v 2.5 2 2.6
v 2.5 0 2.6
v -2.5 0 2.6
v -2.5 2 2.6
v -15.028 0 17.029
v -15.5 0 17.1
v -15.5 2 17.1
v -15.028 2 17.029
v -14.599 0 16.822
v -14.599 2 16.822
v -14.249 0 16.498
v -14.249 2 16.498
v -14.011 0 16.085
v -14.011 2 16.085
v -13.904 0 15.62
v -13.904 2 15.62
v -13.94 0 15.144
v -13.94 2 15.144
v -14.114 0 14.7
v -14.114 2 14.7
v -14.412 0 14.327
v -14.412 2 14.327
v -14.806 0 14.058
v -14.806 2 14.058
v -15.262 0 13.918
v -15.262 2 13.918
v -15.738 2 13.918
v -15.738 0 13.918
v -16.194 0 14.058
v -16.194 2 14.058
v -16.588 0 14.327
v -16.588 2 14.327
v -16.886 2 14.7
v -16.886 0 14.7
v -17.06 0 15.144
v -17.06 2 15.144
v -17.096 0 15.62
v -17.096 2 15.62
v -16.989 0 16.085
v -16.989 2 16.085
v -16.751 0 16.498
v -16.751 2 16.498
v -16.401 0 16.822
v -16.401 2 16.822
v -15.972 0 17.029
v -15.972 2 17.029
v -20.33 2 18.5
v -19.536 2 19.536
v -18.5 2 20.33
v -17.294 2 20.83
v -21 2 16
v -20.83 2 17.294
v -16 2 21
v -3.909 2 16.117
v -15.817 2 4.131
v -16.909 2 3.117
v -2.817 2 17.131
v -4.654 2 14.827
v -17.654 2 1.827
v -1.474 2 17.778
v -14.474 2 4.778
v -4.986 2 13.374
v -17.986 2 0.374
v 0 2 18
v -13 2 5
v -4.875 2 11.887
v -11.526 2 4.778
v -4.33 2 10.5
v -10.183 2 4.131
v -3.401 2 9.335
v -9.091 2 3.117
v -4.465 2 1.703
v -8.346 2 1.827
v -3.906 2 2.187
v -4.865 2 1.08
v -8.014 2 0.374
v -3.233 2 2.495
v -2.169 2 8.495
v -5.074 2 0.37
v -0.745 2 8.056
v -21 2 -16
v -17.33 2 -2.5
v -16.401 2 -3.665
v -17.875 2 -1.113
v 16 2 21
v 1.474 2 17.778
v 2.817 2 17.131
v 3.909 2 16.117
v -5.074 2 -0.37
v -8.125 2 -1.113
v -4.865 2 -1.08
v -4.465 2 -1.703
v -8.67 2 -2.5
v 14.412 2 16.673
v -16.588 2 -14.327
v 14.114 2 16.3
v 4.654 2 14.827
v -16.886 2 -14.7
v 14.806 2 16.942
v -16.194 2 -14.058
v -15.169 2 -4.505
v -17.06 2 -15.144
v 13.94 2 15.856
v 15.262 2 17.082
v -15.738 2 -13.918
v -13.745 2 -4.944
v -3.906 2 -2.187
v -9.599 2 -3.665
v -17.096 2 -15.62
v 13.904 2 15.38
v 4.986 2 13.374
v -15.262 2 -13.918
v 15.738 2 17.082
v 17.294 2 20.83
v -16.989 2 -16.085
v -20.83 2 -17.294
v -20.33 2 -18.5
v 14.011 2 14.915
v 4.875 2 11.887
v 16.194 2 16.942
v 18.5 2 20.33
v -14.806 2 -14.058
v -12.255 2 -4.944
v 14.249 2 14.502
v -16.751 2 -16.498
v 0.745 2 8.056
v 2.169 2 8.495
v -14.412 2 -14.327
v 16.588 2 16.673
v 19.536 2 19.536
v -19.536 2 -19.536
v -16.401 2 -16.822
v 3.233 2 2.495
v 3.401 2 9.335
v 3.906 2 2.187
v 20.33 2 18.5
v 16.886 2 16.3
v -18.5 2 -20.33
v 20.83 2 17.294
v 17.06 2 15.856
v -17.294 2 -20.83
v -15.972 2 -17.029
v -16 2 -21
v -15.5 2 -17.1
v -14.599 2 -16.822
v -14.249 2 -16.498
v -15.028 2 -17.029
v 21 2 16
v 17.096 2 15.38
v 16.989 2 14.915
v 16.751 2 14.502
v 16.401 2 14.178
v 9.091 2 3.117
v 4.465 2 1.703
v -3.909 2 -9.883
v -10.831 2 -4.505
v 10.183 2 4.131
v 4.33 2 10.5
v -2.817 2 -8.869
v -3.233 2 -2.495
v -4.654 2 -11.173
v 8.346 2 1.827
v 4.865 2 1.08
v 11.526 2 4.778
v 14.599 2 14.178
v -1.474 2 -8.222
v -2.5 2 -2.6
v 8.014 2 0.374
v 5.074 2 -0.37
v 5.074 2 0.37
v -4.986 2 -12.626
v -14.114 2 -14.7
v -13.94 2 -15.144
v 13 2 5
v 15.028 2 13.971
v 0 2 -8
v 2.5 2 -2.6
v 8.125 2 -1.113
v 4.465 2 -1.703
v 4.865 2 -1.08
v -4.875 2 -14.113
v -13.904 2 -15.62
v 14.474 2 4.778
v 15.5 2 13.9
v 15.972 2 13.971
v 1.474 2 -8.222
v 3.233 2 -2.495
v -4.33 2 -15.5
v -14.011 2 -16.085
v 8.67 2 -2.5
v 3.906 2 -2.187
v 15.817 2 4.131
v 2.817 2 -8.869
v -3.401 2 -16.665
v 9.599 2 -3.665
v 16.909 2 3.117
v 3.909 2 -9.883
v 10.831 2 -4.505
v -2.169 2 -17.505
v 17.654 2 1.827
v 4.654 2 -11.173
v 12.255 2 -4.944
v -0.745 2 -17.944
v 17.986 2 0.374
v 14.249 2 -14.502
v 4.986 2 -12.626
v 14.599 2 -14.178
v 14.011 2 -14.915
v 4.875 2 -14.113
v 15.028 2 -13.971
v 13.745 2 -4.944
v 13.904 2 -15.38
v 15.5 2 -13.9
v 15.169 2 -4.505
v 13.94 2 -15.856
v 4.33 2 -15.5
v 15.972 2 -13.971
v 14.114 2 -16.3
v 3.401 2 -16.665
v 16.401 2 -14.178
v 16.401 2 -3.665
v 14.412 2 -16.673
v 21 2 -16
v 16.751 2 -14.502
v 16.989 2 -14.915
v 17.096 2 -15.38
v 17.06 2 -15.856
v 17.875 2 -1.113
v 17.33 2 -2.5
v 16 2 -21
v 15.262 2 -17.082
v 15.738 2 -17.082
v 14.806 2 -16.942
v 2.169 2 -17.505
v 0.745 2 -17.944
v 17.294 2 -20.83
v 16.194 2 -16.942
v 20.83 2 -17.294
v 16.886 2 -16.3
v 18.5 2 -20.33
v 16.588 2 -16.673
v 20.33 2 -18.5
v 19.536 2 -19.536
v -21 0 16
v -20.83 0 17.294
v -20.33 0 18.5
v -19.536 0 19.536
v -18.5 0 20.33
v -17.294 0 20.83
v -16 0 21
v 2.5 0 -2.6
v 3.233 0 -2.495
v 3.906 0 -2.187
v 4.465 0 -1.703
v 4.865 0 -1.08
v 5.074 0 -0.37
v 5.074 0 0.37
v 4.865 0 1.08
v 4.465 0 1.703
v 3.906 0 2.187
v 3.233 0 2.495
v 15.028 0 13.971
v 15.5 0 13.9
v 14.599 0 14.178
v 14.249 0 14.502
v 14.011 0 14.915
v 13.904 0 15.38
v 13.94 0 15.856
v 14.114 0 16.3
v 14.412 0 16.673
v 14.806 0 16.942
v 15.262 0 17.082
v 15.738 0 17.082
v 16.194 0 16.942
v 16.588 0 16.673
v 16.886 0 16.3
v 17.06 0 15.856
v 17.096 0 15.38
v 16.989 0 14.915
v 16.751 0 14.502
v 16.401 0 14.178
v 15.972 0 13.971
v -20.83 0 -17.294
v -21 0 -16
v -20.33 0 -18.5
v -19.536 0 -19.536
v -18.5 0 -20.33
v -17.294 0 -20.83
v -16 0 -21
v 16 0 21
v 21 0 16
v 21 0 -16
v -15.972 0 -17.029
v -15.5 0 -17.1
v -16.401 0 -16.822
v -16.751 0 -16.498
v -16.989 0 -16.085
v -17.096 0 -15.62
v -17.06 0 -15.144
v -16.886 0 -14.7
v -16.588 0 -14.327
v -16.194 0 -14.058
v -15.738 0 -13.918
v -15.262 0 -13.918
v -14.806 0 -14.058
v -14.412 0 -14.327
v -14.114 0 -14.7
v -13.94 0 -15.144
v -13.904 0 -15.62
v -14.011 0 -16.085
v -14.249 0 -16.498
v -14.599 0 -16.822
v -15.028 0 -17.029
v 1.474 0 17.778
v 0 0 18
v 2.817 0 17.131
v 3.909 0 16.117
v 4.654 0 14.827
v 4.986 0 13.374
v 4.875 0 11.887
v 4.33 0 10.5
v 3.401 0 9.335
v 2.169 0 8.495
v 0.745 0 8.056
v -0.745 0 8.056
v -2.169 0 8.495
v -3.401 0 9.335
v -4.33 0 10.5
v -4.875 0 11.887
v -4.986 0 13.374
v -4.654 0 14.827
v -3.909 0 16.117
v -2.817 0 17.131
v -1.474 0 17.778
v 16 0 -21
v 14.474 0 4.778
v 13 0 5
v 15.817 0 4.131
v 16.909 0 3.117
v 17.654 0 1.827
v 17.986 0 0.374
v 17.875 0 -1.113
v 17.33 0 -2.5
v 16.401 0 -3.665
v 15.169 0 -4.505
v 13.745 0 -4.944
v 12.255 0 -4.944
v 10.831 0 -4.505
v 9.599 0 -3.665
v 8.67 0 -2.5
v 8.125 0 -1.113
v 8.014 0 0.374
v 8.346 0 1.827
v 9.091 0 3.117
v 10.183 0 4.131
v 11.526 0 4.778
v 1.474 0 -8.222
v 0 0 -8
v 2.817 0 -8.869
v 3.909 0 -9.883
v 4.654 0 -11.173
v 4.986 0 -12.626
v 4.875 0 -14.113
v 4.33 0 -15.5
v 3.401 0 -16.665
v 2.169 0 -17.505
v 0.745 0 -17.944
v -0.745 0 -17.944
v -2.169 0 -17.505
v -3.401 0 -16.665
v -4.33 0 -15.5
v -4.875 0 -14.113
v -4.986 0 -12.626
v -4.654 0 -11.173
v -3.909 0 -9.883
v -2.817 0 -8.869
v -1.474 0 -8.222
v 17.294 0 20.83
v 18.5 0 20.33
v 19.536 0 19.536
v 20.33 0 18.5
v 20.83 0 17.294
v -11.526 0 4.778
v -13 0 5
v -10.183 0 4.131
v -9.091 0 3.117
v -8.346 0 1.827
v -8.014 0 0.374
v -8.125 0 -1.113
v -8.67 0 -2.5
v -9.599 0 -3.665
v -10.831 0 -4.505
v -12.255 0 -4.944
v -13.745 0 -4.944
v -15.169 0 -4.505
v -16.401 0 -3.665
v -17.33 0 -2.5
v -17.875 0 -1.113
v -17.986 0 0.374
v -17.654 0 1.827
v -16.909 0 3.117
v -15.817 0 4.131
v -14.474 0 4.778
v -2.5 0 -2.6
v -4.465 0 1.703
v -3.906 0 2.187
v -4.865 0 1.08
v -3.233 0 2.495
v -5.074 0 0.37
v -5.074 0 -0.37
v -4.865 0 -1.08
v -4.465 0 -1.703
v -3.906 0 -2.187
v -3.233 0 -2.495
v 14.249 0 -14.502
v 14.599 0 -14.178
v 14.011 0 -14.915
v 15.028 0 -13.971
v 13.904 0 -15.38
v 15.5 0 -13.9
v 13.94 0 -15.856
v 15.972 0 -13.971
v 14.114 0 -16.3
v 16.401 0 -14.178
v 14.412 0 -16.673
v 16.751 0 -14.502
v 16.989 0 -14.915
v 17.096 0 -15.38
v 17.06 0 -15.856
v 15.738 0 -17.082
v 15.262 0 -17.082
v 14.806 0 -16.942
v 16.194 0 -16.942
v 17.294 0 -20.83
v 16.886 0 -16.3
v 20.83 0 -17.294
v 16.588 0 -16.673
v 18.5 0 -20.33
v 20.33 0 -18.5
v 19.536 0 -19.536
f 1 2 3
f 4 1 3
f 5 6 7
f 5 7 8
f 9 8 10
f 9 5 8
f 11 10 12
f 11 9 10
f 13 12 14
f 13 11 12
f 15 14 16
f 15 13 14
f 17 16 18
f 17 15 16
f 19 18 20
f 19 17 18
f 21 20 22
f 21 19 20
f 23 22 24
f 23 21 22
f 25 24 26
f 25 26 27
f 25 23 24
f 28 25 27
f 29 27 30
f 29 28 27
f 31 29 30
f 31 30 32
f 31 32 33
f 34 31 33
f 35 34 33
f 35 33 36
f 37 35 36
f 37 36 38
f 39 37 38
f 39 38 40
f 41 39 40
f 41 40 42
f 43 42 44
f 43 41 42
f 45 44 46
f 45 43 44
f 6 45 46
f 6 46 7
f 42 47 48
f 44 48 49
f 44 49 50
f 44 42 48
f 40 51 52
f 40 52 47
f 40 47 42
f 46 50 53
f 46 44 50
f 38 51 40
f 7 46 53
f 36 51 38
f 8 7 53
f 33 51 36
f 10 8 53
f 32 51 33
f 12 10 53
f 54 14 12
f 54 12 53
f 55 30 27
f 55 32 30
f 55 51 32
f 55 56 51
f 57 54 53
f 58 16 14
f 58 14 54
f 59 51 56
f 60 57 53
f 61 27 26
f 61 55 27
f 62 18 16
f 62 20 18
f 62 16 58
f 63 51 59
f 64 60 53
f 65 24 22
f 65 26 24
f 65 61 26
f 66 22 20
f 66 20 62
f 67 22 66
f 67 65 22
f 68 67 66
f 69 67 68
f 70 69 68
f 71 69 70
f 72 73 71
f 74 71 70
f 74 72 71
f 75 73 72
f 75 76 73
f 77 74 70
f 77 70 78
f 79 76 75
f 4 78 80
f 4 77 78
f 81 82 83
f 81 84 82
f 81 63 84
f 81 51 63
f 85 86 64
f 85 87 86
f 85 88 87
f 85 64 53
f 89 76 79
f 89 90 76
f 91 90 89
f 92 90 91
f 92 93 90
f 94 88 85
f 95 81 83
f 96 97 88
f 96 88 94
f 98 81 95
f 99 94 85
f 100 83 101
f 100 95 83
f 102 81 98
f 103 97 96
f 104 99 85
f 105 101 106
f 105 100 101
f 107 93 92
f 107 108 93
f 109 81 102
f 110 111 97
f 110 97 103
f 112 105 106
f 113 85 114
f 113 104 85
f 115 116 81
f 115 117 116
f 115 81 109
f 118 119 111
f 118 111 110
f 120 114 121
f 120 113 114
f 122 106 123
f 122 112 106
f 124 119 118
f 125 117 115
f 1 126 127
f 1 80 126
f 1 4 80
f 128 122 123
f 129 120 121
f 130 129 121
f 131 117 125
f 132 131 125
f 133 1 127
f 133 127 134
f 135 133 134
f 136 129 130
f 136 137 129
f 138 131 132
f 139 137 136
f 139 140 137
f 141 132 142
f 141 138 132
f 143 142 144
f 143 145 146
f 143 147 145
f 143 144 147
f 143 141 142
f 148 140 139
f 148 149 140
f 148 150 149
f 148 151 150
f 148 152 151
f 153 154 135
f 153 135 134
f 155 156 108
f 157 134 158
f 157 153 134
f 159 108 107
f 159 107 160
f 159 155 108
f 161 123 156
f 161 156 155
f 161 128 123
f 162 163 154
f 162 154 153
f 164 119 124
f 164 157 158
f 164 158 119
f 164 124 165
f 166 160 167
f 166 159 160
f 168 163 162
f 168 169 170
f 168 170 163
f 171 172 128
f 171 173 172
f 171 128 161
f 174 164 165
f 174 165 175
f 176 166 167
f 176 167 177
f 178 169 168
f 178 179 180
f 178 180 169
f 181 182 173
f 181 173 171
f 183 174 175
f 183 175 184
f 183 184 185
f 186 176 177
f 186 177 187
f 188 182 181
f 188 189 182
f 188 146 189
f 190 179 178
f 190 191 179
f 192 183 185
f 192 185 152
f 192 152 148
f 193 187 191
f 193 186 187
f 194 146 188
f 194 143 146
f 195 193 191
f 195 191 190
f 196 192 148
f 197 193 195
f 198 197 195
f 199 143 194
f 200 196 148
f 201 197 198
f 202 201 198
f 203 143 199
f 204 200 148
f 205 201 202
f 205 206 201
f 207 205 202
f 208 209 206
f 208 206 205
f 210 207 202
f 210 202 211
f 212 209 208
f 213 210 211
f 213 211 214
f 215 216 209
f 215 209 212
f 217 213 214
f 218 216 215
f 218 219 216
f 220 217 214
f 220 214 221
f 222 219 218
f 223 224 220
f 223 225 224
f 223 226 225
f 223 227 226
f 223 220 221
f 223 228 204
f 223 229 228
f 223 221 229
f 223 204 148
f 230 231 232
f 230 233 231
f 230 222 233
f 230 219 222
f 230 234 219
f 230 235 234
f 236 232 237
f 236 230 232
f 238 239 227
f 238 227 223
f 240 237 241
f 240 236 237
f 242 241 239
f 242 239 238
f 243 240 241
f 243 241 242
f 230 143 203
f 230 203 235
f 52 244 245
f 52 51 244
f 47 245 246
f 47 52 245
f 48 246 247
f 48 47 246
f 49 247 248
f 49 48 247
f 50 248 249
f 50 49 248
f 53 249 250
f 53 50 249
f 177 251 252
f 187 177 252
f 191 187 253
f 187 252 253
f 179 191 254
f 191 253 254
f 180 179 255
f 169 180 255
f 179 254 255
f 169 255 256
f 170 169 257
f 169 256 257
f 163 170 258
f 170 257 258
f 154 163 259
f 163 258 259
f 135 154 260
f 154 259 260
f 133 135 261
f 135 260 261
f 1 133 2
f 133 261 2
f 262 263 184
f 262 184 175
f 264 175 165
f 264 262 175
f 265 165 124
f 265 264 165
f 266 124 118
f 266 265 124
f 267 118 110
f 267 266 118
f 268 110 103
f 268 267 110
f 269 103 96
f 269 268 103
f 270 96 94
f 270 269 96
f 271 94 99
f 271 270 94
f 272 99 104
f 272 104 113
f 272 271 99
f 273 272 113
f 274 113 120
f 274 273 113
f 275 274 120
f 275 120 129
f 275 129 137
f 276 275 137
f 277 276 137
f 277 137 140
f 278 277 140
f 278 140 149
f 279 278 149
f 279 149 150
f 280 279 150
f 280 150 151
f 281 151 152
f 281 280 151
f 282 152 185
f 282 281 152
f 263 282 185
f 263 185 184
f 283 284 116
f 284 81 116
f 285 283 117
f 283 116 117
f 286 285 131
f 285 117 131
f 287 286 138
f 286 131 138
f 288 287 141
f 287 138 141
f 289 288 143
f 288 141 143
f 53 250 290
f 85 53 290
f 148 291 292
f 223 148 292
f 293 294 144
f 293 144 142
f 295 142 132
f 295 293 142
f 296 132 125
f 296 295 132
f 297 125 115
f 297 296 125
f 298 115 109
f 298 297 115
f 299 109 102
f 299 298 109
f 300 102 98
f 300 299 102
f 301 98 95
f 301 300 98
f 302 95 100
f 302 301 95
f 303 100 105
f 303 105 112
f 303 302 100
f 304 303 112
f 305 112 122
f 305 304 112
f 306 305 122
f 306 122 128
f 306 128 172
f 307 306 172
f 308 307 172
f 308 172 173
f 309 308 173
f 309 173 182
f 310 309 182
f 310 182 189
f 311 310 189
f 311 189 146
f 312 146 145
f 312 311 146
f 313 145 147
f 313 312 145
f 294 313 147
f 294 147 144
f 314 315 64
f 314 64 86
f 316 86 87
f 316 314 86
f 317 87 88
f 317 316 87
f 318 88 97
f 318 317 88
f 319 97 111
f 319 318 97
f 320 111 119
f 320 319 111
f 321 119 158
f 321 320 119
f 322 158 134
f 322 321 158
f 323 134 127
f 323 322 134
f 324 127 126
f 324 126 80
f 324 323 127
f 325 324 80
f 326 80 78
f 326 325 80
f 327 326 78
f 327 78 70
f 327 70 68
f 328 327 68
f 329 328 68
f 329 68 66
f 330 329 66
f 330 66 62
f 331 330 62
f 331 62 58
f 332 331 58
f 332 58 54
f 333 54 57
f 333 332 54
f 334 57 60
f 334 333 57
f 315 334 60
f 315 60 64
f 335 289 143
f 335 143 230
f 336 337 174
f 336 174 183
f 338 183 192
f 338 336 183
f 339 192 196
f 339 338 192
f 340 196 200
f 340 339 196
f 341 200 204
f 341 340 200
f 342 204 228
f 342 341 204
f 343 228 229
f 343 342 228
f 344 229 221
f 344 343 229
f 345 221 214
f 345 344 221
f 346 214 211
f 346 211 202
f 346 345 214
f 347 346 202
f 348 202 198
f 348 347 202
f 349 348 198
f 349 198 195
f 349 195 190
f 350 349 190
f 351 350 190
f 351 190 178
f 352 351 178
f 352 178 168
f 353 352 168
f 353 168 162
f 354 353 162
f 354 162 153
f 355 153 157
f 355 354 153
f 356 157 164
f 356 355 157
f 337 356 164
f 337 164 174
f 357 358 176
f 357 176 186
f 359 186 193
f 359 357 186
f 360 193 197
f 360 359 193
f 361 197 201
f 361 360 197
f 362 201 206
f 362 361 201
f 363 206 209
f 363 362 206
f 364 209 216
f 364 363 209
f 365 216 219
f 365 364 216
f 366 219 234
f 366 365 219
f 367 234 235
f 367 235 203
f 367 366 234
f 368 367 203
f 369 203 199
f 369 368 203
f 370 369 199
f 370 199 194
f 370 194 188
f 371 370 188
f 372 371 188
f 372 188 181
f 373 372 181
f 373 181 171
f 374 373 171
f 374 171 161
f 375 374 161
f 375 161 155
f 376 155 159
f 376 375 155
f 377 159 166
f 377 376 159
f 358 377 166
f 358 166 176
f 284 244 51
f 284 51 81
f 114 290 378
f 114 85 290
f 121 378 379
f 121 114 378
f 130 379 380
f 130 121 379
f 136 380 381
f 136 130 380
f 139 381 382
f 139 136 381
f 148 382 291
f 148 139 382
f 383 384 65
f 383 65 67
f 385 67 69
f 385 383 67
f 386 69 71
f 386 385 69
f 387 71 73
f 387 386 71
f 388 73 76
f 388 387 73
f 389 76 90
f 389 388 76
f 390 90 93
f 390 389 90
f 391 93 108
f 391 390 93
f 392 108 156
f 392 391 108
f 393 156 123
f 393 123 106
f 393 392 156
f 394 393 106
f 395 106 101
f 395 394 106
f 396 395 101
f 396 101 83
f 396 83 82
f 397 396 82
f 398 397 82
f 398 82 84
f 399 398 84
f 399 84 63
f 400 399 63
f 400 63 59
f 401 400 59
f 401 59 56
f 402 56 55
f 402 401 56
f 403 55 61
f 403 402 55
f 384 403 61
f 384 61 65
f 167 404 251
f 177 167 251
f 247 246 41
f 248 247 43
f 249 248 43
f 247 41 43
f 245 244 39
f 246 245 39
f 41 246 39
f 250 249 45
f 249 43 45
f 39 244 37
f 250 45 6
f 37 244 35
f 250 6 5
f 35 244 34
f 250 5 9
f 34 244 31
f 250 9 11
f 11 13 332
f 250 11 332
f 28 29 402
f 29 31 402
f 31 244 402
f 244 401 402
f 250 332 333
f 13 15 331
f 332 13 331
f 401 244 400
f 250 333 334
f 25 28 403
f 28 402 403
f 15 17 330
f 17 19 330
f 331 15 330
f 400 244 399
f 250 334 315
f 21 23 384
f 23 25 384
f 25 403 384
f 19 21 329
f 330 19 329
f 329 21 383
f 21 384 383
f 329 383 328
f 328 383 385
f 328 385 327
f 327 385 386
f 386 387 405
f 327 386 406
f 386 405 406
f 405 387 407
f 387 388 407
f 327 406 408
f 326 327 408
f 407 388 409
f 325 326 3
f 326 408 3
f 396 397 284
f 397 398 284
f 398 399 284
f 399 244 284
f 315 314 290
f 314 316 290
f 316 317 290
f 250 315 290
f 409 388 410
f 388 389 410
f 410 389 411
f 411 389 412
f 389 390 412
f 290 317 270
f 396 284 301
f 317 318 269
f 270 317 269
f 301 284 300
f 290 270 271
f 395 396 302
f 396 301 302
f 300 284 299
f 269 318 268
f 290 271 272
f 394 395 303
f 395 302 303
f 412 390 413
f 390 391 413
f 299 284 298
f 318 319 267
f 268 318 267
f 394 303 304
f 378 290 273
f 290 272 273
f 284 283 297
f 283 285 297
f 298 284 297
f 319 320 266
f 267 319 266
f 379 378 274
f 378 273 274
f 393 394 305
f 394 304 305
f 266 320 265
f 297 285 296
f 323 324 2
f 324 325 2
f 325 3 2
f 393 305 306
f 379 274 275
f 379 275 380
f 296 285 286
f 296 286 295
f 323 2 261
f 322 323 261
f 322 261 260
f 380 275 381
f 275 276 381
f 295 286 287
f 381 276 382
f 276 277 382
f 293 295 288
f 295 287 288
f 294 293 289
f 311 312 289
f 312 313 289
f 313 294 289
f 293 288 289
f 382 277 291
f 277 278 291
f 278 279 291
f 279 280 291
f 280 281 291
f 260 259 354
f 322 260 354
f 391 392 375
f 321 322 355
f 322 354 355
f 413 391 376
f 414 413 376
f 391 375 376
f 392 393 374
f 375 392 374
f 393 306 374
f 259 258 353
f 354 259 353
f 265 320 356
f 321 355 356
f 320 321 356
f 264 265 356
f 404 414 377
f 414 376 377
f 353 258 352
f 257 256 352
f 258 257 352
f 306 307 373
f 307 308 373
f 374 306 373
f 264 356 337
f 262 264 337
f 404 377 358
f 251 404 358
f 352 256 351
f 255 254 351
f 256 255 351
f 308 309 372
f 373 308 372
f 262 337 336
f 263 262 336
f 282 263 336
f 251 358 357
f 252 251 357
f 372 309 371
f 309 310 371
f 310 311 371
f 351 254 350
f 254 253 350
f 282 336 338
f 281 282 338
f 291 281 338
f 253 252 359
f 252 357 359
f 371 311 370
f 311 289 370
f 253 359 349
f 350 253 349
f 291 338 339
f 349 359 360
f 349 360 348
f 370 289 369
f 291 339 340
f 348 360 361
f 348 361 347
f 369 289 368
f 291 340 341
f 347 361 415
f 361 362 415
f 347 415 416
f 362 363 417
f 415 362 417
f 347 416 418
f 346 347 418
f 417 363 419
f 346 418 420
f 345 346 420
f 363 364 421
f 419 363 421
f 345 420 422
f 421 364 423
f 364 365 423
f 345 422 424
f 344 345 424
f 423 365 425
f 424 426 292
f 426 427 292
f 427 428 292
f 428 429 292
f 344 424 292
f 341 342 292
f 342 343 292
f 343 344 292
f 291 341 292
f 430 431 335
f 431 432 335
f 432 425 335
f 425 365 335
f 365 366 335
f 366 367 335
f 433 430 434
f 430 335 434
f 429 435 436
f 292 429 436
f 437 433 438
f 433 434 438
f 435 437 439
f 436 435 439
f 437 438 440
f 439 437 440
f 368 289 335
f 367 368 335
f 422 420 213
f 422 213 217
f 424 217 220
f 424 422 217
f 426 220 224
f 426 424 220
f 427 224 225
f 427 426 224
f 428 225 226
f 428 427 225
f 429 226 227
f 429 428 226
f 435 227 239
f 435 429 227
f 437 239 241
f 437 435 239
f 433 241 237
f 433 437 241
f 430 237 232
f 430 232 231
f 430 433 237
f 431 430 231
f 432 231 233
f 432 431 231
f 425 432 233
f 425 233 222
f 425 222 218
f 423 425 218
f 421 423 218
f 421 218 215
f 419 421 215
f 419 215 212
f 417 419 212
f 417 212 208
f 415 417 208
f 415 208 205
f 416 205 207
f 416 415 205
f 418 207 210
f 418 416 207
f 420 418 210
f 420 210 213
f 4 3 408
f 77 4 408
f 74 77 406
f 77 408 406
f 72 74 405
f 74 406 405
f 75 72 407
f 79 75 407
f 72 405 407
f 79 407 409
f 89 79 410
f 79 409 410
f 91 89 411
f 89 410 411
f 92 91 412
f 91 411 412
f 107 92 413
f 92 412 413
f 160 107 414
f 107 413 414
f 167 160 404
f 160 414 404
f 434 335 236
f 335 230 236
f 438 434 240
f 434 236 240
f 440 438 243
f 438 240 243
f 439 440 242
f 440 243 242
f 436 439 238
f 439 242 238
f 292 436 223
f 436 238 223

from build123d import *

# Parameters (mm, degrees)
SKETCH1_W           = 42
SKETCH1_H           = 42
SKETCH1_R           = 1.6
SKETCH1_R_2         = 5
BOSS_EXTRUDE1_DEPTH = 2
FILLET1_R           = 5


with BuildPart() as part:
    # Sketch1 → Boss-Extrude1 (new body)
    with BuildSketch(Plane(origin=(0, 0, 0), x_dir=(1, 0, 0), z_dir=(0, 1, 0))):
        Rectangle(SKETCH1_W, SKETCH1_H)
        with Locations(Location((15.5, 15.5, 0), (0, 0, 270))):
            Circle(SKETCH1_R, mode=Mode.SUBTRACT)
        with Locations(Location((-15.5, 15.5, 0), (0, 0, 90))):
            Circle(SKETCH1_R, mode=Mode.SUBTRACT)
        with Locations(Location((15.5, -15.5, 0), (0, 0, 90))):
            Circle(SKETCH1_R, mode=Mode.SUBTRACT)
        with Locations(Location((-15.5, -15.5, 0), (0, 0, 270))):
            Circle(SKETCH1_R, mode=Mode.SUBTRACT)
        with Locations(Location((0, 13, 0), (0, 0, 270))):
            Circle(SKETCH1_R_2, mode=Mode.SUBTRACT)
        with Locations(Location((13, 0, 0), (0, 0, 270))):
            Circle(SKETCH1_R_2, mode=Mode.SUBTRACT)
        with Locations(Location((0, -13, 0), (0, 0, 270))):
            Circle(SKETCH1_R_2, mode=Mode.SUBTRACT)
        with Locations(Location((-13, 0, 0), (0, 0, 270))):
            Circle(SKETCH1_R_2, mode=Mode.SUBTRACT)
        with BuildLine():
            Line((-2.5, 2.6), (2.5, 2.6))
            ThreePointArc((2.5, 2.6), (5.1, 0), (2.5, -2.6))
            Line((2.5, -2.6), (-2.5, -2.6))
            ThreePointArc((-2.5, -2.6), (-5.1, 0), (-2.5, 2.6))
        make_face(mode=Mode.SUBTRACT)
    extrude(amount=BOSS_EXTRUDE1_DEPTH)

    # Fillet1
    fillet1_edges = [part.edges().sort_by_distance(p)[0] for p in [
        (21, 1, 21),
        (-21, 1, 21),
        (-21, 1, -21),
        (21, 1, -21),
    ]]
    fillet(fillet1_edges, radius=FILLET1_R)


solid = part.part
